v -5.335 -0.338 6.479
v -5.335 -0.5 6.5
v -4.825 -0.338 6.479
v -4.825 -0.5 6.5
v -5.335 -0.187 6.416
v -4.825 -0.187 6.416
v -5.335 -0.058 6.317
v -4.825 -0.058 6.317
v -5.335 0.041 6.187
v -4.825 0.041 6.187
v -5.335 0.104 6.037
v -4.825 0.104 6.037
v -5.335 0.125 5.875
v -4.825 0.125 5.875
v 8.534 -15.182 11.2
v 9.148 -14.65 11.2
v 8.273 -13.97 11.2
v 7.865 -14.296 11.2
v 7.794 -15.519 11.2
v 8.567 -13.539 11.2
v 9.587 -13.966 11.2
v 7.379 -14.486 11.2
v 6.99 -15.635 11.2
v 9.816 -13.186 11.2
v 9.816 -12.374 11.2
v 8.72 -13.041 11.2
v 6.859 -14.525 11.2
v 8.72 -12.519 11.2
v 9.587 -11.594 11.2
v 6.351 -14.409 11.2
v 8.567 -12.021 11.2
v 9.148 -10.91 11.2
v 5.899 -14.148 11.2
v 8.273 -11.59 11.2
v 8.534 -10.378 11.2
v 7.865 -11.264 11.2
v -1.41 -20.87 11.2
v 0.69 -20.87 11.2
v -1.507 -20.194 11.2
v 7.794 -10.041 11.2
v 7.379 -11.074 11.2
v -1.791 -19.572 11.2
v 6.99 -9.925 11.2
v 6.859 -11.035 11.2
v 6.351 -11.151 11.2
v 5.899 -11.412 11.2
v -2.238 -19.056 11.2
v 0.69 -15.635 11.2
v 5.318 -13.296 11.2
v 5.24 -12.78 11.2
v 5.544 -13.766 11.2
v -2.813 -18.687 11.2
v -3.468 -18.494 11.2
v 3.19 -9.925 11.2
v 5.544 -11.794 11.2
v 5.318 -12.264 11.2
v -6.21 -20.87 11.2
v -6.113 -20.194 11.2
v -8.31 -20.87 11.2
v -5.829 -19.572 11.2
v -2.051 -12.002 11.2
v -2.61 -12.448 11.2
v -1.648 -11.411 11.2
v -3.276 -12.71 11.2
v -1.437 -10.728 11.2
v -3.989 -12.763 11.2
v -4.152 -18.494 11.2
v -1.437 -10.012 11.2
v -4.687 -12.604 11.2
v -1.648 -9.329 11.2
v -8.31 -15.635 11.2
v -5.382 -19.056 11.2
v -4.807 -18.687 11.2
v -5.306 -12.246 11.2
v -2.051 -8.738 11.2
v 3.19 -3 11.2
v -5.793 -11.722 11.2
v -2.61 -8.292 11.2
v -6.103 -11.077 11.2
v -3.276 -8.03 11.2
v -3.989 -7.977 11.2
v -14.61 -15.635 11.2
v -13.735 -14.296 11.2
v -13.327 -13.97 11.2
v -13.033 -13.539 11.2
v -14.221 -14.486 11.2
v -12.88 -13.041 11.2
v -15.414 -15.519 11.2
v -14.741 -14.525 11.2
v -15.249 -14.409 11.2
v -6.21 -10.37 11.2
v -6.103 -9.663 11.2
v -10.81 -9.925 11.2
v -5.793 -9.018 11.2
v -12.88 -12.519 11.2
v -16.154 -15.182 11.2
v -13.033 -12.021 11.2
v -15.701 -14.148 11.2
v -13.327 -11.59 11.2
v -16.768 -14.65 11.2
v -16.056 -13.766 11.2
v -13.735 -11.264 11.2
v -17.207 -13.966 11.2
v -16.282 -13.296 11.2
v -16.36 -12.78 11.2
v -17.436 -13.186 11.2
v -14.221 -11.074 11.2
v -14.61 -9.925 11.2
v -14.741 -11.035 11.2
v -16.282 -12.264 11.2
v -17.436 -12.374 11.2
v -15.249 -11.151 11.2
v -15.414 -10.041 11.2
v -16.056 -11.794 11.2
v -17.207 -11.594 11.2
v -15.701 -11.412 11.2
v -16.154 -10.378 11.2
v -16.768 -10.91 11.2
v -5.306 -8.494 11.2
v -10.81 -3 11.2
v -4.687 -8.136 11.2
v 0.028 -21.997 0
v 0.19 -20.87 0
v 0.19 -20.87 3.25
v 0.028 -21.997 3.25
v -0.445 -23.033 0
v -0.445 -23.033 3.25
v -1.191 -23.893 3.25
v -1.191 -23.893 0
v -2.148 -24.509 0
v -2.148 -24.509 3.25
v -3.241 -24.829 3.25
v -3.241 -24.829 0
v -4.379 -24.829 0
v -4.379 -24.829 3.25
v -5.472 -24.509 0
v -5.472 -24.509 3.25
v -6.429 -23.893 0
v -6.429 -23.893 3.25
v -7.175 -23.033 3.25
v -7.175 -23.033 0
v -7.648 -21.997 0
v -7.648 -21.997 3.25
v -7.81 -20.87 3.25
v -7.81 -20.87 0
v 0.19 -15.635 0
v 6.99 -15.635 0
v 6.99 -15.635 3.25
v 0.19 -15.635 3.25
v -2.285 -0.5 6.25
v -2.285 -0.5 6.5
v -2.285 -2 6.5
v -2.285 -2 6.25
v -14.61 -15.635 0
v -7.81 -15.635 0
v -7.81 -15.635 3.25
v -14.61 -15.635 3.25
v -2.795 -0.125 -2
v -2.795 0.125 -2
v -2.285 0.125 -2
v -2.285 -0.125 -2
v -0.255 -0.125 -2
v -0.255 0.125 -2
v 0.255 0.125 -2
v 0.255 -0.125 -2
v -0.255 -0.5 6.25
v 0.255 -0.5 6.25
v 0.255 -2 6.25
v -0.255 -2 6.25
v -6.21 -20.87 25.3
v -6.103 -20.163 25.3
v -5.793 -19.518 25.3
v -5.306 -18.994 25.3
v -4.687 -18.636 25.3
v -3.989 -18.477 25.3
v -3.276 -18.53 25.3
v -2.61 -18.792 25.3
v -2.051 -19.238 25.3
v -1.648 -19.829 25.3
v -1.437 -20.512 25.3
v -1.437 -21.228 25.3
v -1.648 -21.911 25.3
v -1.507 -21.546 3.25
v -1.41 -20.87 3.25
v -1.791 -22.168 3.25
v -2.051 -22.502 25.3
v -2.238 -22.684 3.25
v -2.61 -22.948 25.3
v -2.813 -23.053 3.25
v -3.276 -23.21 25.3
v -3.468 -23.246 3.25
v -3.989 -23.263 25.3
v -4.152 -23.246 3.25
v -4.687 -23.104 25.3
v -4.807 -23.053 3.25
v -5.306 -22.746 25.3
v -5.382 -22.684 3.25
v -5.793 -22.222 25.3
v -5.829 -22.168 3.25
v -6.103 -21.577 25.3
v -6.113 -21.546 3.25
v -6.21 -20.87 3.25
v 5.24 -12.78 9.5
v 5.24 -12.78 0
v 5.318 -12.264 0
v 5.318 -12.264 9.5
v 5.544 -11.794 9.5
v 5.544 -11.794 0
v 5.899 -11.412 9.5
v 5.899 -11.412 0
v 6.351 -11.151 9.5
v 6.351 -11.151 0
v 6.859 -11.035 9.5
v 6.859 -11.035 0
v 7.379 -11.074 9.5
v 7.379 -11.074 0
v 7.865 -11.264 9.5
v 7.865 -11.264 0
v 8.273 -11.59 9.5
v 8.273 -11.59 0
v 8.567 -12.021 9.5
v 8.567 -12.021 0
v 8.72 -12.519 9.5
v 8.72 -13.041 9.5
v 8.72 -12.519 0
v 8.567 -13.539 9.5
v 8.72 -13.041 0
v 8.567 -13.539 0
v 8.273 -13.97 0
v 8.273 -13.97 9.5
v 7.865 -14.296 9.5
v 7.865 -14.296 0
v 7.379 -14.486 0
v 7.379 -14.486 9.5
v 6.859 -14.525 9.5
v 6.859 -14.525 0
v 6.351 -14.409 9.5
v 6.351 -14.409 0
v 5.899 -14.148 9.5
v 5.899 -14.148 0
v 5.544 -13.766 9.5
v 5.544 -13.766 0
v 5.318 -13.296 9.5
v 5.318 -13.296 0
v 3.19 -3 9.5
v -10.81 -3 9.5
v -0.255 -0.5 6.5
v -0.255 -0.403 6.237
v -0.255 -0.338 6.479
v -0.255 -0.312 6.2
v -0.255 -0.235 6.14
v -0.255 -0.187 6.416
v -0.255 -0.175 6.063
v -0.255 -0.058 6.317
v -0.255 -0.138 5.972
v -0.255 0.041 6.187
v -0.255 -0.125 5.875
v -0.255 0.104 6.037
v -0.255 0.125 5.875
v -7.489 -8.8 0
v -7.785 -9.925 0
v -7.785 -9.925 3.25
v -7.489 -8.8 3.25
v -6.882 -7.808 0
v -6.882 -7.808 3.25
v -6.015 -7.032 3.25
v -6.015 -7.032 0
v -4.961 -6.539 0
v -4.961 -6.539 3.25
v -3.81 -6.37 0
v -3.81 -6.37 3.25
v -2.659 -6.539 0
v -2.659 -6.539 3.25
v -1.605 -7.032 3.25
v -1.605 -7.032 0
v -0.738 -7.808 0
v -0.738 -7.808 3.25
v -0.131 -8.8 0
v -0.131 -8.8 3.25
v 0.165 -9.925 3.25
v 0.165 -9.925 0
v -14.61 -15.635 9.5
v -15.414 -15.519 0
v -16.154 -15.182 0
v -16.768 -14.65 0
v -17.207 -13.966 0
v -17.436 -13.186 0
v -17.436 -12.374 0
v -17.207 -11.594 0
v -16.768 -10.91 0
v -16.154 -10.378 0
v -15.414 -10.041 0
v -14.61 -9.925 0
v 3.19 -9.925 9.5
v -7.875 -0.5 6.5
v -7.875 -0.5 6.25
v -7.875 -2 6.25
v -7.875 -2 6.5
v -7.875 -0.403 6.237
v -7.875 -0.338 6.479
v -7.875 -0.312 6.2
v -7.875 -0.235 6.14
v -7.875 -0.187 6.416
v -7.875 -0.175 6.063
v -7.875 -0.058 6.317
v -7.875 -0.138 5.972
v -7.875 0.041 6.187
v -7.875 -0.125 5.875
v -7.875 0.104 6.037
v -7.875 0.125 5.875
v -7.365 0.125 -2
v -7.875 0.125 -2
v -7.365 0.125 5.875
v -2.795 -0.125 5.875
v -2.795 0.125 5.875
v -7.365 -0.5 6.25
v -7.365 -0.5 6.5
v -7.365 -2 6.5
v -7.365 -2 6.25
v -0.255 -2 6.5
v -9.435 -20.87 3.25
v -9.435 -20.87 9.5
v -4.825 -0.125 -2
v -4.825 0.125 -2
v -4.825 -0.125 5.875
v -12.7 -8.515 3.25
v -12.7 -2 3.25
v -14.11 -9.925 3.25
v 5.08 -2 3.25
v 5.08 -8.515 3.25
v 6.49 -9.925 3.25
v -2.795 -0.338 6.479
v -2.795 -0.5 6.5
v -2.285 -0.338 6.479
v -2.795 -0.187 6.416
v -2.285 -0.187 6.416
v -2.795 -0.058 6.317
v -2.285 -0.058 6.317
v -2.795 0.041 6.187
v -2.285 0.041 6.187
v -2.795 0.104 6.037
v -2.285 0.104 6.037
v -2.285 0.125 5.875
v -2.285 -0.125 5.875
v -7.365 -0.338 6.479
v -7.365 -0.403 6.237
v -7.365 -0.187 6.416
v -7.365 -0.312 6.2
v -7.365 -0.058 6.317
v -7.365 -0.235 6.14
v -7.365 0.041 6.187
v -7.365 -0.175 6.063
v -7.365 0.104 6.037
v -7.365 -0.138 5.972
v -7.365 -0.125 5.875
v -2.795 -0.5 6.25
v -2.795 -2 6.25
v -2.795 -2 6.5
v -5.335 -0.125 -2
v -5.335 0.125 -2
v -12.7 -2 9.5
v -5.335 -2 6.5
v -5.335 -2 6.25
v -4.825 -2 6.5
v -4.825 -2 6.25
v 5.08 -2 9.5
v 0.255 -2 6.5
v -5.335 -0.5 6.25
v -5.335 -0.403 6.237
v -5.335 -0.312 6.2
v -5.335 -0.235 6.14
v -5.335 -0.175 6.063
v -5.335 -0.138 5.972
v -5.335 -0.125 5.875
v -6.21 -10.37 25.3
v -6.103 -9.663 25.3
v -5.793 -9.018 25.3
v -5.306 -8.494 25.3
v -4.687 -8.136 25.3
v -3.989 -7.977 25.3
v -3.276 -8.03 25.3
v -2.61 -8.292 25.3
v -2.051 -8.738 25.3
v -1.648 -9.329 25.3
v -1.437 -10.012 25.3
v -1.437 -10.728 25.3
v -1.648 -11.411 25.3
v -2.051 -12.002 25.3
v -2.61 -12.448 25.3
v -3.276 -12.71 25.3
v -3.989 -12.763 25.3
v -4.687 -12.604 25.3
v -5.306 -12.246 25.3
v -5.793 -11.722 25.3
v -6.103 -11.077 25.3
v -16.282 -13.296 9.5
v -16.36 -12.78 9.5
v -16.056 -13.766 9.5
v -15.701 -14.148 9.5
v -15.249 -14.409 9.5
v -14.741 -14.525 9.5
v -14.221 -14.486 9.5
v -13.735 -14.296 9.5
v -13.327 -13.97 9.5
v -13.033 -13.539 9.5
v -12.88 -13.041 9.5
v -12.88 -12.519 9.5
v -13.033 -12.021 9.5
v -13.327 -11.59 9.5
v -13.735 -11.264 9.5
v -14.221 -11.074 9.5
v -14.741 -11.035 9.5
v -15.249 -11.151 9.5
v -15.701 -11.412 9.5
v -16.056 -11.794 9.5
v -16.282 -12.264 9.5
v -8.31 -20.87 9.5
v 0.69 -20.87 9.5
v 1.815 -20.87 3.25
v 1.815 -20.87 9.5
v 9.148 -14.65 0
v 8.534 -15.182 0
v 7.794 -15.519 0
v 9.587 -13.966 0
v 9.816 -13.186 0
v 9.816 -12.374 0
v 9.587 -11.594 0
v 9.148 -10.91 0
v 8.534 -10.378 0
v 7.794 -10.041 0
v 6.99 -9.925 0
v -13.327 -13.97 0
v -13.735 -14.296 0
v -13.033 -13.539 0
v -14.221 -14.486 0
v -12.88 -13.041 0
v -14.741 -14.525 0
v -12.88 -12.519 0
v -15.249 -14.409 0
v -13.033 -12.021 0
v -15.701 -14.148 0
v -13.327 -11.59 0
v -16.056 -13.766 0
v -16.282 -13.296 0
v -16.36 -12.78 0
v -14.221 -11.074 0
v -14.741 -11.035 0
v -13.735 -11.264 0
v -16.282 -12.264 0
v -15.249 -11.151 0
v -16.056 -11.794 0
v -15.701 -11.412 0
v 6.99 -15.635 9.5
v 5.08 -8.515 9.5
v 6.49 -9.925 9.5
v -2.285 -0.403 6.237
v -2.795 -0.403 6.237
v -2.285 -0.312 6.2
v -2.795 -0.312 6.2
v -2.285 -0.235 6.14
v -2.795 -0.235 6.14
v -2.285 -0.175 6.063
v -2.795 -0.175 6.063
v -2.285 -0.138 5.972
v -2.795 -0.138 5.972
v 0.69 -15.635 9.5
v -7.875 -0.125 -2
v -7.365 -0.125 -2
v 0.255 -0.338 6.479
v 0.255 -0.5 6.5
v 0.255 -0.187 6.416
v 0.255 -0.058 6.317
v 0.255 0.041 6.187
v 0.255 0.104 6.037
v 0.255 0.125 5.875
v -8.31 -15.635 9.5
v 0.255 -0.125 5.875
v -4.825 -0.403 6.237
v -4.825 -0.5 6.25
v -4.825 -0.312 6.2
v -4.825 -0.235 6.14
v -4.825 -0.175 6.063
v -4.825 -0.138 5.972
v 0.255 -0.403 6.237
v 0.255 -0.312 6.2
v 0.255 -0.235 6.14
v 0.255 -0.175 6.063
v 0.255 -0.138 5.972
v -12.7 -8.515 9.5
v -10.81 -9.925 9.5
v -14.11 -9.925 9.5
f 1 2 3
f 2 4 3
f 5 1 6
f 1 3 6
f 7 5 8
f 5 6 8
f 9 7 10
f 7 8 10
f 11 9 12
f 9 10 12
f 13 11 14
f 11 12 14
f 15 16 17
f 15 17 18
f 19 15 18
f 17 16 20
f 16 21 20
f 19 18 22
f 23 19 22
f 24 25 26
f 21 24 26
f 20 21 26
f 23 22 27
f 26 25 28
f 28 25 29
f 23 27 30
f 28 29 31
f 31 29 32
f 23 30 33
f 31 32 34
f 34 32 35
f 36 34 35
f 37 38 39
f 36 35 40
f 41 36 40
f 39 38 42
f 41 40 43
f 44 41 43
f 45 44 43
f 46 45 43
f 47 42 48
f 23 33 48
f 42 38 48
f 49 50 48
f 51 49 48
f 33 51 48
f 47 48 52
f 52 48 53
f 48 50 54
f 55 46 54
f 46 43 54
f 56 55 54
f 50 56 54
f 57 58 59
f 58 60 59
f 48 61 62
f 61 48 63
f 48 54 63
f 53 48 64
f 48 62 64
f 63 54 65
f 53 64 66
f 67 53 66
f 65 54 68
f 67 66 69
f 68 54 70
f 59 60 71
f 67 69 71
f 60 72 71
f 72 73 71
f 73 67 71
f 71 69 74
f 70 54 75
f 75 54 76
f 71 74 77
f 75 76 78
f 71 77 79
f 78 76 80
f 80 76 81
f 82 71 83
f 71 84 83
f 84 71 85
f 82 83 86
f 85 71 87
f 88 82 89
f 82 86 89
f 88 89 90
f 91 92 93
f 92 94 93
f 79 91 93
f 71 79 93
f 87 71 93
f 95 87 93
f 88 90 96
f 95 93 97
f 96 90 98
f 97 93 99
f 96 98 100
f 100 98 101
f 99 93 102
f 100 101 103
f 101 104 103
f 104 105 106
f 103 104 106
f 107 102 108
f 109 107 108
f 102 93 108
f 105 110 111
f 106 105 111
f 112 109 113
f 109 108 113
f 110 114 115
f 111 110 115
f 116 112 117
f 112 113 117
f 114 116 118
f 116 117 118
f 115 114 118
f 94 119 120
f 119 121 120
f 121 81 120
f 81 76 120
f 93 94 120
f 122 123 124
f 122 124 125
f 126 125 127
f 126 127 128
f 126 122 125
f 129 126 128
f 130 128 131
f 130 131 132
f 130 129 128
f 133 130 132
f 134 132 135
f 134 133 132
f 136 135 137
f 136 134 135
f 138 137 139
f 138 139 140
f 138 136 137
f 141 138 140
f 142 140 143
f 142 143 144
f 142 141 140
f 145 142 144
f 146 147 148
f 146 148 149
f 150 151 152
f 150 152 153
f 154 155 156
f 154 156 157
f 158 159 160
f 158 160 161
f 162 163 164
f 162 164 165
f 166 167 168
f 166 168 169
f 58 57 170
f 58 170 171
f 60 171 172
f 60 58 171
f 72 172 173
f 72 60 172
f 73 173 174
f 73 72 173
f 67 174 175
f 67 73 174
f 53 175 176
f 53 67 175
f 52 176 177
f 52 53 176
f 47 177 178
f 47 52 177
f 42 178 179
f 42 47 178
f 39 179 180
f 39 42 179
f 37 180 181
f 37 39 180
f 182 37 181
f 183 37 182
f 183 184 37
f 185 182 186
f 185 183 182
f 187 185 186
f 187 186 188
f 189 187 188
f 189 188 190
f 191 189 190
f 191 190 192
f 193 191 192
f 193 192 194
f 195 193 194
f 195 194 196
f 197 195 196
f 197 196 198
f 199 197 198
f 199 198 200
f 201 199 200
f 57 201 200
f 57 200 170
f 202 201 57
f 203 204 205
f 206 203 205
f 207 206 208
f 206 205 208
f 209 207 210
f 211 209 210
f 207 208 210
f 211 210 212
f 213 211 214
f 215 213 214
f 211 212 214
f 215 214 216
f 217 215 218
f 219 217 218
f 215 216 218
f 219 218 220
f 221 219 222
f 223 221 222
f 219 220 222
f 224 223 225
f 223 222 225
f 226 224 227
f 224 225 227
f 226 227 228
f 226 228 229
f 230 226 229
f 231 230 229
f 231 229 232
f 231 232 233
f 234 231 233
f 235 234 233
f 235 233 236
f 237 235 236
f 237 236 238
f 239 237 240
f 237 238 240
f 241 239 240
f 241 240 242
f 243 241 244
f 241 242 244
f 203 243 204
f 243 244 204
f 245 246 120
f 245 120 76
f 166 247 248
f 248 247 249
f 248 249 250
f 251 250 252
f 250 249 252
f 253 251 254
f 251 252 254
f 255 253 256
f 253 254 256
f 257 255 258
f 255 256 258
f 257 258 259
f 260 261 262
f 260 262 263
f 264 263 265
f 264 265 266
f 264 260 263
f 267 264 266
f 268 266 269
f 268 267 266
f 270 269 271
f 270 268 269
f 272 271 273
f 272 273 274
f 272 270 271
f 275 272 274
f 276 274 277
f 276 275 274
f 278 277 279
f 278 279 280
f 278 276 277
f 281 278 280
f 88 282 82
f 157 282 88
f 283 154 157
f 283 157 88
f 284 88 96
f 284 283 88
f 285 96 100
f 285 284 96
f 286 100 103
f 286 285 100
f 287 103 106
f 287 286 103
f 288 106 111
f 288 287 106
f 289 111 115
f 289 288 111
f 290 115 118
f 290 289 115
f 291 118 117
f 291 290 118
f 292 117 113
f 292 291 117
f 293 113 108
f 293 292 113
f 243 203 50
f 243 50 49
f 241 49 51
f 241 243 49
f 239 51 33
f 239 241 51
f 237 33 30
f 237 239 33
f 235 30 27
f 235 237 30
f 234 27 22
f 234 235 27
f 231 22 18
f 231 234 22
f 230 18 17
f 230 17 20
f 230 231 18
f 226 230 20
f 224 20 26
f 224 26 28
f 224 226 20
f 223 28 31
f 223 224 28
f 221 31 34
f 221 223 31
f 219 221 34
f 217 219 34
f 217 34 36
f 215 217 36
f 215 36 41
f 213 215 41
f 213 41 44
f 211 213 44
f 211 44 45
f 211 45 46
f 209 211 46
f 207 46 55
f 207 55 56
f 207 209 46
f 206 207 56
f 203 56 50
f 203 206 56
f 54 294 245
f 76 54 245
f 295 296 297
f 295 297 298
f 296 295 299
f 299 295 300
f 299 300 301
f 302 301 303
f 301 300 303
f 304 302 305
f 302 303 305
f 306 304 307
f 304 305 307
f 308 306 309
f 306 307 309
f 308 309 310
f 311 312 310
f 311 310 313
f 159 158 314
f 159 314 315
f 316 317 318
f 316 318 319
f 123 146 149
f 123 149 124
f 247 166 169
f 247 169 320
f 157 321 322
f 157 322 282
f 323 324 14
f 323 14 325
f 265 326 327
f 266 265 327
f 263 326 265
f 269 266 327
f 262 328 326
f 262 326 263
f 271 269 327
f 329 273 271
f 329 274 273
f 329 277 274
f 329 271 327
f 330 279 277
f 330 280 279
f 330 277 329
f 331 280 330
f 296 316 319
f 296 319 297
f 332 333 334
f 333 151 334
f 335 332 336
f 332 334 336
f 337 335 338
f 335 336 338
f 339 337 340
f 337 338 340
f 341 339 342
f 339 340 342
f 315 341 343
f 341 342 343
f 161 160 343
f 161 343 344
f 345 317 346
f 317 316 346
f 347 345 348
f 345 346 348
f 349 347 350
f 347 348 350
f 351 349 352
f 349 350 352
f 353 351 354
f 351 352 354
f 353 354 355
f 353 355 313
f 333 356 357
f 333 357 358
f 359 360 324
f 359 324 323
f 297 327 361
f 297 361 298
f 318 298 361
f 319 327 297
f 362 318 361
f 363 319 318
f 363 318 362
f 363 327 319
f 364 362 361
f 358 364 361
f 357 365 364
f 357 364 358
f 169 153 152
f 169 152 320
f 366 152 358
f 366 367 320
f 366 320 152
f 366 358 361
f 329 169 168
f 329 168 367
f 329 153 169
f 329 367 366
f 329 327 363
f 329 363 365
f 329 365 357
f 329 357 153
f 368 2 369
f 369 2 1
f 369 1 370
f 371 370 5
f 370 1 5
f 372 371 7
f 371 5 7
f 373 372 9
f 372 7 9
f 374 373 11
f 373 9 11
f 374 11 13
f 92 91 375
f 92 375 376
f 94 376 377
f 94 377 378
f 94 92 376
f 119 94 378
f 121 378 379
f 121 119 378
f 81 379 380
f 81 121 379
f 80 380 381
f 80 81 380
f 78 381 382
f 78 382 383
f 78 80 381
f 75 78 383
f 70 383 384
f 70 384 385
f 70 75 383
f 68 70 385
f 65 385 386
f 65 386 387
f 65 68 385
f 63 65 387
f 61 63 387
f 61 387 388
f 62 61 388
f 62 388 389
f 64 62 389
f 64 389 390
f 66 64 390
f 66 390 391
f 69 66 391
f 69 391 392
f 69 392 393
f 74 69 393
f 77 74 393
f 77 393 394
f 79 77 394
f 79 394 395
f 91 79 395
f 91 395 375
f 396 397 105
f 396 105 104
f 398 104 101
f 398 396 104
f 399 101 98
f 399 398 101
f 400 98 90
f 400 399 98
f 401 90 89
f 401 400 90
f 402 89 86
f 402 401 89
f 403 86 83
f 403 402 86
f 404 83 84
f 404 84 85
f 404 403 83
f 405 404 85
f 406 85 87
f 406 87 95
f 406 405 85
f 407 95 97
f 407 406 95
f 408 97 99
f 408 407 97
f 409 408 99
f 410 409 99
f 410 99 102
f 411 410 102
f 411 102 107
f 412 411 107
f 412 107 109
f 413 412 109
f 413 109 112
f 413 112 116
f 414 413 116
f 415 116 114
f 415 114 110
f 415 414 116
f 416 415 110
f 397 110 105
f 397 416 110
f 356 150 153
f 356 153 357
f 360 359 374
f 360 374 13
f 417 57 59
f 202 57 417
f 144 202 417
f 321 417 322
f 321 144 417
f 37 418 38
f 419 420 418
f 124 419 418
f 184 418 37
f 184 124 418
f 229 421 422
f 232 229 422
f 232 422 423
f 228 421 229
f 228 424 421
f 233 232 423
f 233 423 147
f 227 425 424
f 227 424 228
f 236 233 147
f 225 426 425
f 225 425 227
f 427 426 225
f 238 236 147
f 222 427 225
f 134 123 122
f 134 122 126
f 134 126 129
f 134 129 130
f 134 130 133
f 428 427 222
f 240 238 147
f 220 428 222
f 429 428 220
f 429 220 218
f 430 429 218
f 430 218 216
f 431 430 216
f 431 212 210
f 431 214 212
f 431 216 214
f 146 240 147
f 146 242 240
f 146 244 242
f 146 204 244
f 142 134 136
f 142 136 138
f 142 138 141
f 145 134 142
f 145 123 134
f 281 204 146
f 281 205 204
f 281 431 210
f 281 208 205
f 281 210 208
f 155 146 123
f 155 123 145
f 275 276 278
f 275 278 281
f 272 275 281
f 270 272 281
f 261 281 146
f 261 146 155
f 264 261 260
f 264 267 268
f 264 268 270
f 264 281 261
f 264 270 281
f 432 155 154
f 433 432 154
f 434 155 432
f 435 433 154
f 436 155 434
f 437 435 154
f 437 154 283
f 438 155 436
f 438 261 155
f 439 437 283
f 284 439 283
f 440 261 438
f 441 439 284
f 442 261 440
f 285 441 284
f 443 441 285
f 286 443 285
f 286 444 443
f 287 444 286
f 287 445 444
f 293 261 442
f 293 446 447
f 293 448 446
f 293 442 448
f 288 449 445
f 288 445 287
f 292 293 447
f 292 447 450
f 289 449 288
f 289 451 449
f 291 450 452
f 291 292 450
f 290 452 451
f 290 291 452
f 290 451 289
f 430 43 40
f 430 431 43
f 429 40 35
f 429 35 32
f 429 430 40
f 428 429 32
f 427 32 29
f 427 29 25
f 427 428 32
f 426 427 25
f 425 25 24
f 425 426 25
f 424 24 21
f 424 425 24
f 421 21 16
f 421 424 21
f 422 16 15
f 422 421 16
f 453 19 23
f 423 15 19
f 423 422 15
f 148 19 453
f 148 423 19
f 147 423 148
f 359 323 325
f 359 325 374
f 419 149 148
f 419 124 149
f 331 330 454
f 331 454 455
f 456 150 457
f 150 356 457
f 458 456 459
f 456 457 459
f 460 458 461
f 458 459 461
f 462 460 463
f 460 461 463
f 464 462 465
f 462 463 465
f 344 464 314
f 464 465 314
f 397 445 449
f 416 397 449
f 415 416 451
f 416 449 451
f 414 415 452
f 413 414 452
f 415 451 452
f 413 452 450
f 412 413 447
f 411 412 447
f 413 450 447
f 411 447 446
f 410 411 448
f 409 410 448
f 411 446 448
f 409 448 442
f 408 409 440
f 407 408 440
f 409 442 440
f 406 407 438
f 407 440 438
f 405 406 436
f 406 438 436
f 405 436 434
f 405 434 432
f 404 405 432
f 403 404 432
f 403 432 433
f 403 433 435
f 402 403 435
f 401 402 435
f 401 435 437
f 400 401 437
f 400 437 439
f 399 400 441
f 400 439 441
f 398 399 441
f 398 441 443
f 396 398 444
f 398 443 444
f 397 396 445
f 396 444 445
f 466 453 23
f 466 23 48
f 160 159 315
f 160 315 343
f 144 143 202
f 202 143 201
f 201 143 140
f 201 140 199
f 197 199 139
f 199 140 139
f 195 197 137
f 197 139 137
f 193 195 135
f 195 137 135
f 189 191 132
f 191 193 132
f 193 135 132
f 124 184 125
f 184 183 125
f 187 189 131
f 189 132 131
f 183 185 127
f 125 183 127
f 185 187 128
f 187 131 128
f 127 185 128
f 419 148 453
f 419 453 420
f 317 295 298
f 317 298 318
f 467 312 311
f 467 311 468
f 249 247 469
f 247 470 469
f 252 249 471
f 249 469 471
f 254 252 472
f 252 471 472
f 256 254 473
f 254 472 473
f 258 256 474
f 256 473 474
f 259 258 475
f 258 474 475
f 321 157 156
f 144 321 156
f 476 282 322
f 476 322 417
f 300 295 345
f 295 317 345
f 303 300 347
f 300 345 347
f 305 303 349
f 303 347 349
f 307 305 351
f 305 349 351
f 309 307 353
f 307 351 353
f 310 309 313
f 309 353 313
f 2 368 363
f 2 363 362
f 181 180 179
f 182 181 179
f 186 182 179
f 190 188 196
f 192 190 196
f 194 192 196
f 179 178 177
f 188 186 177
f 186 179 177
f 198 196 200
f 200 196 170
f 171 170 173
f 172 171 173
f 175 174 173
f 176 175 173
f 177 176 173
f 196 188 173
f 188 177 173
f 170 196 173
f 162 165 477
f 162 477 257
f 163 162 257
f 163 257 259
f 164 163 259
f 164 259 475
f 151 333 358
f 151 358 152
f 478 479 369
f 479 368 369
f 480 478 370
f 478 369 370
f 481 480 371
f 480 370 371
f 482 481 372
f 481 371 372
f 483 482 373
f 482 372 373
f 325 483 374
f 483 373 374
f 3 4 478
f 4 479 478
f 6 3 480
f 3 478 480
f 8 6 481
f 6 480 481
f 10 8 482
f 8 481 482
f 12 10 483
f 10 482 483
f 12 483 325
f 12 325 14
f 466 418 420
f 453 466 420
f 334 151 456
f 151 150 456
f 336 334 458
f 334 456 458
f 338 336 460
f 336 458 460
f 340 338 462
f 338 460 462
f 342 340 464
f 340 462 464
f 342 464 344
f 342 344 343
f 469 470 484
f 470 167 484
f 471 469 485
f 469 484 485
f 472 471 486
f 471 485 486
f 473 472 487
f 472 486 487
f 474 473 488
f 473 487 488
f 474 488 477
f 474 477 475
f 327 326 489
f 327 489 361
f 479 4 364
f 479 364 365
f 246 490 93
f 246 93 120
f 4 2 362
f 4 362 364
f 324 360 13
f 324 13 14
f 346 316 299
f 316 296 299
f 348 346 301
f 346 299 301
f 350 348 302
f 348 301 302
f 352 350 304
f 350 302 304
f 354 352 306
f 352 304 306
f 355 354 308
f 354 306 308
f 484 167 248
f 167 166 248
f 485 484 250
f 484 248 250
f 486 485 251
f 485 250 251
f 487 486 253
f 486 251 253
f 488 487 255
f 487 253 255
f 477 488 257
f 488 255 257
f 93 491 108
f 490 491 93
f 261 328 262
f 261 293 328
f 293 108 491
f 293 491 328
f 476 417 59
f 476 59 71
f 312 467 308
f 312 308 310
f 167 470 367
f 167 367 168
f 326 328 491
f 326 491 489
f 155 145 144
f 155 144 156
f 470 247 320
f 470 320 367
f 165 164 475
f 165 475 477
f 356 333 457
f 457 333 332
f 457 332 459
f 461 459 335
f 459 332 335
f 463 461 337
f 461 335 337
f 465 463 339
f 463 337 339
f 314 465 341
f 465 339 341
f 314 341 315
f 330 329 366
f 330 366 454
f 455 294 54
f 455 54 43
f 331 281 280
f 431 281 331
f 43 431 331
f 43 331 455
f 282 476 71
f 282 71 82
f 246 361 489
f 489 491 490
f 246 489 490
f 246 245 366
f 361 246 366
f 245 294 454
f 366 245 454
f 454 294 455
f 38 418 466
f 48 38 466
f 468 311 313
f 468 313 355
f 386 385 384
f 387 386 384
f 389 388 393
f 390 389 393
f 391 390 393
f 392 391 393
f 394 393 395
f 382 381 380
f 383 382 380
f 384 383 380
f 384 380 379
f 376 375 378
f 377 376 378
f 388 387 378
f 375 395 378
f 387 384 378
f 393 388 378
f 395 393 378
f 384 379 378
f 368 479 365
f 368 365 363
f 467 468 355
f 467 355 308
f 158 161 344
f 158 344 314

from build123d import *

# Parameters (mm, degrees)
SKETCH1_R           = 1.75
BOSS_EXTRUDE1_DEPTH = 3.25
BOSS_EXTRUDE3_START = -3.25
SKETCH1_4_R         = 1.75
BOSS_EXTRUDE3_DEPTH = 6.25
SKETCH3_W           = 9
SKETCH3_H           = 5.235
SKETCH3_R           = 1.75
SKETCH3_W_2         = 14
SKETCH3_H_2         = 6.925
BOSS_EXTRUDE4_DEPTH = 1.7
SKETCH1_5_R         = 2.4
BOSS_EXTRUDE5_DEPTH = 25.3
SKETCH5_W           = 0.51
SKETCH5_H           = 0.25
LPATTERN1_COUNT     = 4
LPATTERN1_PITCH     = 2.54


with BuildPart() as part:
    # Sketch1 → Boss-Extrude1 (new body)
    with BuildSketch(Plane(origin=(0, 0, 0), x_dir=(1, 0, 0), z_dir=(0, 0, -1))):
        with BuildLine():
            Line((-14.61, 9.925), (-7.785169808, 9.925))
            ThreePointArc((-7.785169808, 9.925), (-3.81, 6.37), (0.165169808, 9.925))
            Line((0.165169808, 9.925), (6.99, 9.925))
            ThreePointArc((6.99, 9.925), (9.845, 12.78), (6.99, 15.635))
            Line((6.99, 15.635), (0.19, 15.635))
            Line((0.19, 15.635), (0.19, 20.87))
            ThreePointArc((0.19, 20.87), (-3.81, 24.87), (-7.81, 20.87))
            Line((-7.81, 20.87), (-7.81, 15.635))
            Line((-7.81, 15.635), (-14.61, 15.635))
            ThreePointArc((-14.61, 15.635), (-17.465, 12.78), (-14.61, 9.925))
        make_face()
        with Locations(Location((-14.61, 12.78, 0), (0, 0, 180))):
            Circle(SKETCH1_R, mode=Mode.SUBTRACT)
        with Locations(Location((6.99, 12.78, 0), (0, 0, 180))):
            Circle(SKETCH1_R, mode=Mode.SUBTRACT)
    extrude(amount=-BOSS_EXTRUDE1_DEPTH)

    # Sketch1<4> → Boss-Extrude3 (add)
    with BuildSketch(Plane(origin=(0, 0, 0), x_dir=(1, 0, 0), z_dir=(0, 0, -1)).offset(BOSS_EXTRUDE3_START)):
        with BuildLine():
            Line((-12.7, 8.515), (-12.7, 2))
            Line((-12.7, 2), (5.08, 2))
            Line((5.08, 2), (5.08, 8.515))
            Line((5.08, 8.515), (6.49, 9.925))
            Line((6.49, 9.925), (6.99, 9.925))
            ThreePointArc((6.99, 9.925), (9.845, 12.78), (6.99, 15.635))
            Line((6.99, 15.635), (1.814694354, 20.87))
            Line((1.814694354, 20.87), (-9.434694354, 20.87))
            Line((-9.434694354, 20.87), (-14.61, 15.635))
            ThreePointArc((-14.61, 15.635), (-17.465, 12.78), (-14.61, 9.925))
            Line((-14.61, 9.925), (-14.11, 9.925))
            Line((-14.11, 9.925), (-12.7, 8.515))
        make_face()
        with Locations(Location((-14.61, 12.78, 0), (0, 0, 180))):
            Circle(SKETCH1_4_R, mode=Mode.SUBTRACT)
        with Locations(Location((6.99, 12.78, 0), (0, 0, 180))):
            Circle(SKETCH1_4_R, mode=Mode.SUBTRACT)
    extrude(amount=-BOSS_EXTRUDE3_DEPTH)

    # Sketch3 → Boss-Extrude4 (add)
    # profile 1 of 3: a face of its own
    with BuildSketch(Plane.XY.offset(9.5)):
        with Locations((-3.81, -18.2525)):
            Rectangle(SKETCH3_W, SKETCH3_H)
    # profile 2 of 3: a face of its own
    with BuildSketch(Plane.XY.offset(9.5)):
        with BuildLine():
            Line((6.99, -15.635), (-14.61, -15.635))
            ThreePointArc((-14.61, -15.635), (-17.465, -12.78), (-14.61, -9.925))
            Line((-14.61, -9.925), (-14.11, -9.925))
            Line((-14.11, -9.925), (6.49, -9.925))
            Line((6.49, -9.925), (6.99, -9.925))
            ThreePointArc((6.99, -9.925), (9.845, -12.78), (6.99, -15.635))
        make_face()
        with Locations(Location((-14.61, -12.78, 0), (0, 0, 180))):
            Circle(SKETCH3_R, mode=Mode.SUBTRACT)
        with Locations(Location((6.99, -12.78, 0), (0, 0, 180))):
            Circle(SKETCH3_R, mode=Mode.SUBTRACT)
    # profile 3 of 3: a face of its own
    with BuildSketch(Plane.XY.offset(9.5)):
        with Locations((-3.81, -6.4625)):
            Rectangle(SKETCH3_W_2, SKETCH3_H_2)
    extrude(amount=BOSS_EXTRUDE4_DEPTH)

    # Sketch1<5> → Boss-Extrude5 (add)
    with BuildSketch(Plane(origin=(0, 0, 0), x_dir=(1, 0, 0), z_dir=(0, 0, -1))):
        with Locations(Location((-3.81, 20.87, 0), (0, 0, 180))):
            Circle(SKETCH1_5_R)
        with Locations(Location((-3.81, 10.37, 0), (0, 0, 180))):
            Circle(SKETCH1_5_R)
    extrude(amount=-BOSS_EXTRUDE5_DEPTH)

    # Sweep1: sweep along a path in Sketch4
    with BuildLine(Plane(origin=(0, 0, 0), x_dir=(0, 0, -1), z_dir=(1, 0, 0))) as sweep1_path:
        Line((-6.375, -2), (-6.375, -0.5))
        ThreePointArc((-6.375, -0.5), (-6.228553391, -0.146446609), (-5.875, 0))
        Line((-5.875, 0), (0, 0))
        Line((0, 0), (2, 0))
    # Sketch5 → Sweep1 (sweep)
    with BuildSketch(Plane(origin=(0, -2, 0), x_dir=(1, 0, 0), z_dir=(0, 1, 0))):
        with Locations((0, -6.375)):
            Rectangle(SKETCH5_W, SKETCH5_H)
    sweep1 = sweep(path=sweep1_path.line)

    # LPattern1: Sweep1 ×4
    with Locations(*[(-i * LPATTERN1_PITCH, 0, 0) for i in range(1, LPATTERN1_COUNT)]):
        add(sweep1)


solid = part.part
